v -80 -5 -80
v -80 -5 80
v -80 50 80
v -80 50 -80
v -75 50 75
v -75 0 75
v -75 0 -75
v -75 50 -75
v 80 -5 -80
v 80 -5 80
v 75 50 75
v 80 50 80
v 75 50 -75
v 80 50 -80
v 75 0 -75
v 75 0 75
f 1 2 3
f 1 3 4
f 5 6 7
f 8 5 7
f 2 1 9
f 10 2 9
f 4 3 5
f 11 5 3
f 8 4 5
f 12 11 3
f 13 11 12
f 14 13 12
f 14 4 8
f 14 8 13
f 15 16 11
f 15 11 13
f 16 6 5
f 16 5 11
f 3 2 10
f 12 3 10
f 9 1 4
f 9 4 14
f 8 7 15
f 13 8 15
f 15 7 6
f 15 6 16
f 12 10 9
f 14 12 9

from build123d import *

# Parameters (mm, degrees)
ESQUISSE1_W        = 150
ESQUISSE1_H        = 150
BOSS_EXTRU_1_DEPTH = 50
COQUE2_T           = 5


with BuildPart() as part:
    # Esquisse1 → Boss.-Extru.1 (new body)
    with BuildSketch(Plane(origin=(0, 0, 0), x_dir=(1, 0, 0), z_dir=(0, 1, 0))):
        Rectangle(ESQUISSE1_W, ESQUISSE1_H)
    extrude(amount=BOSS_EXTRU_1_DEPTH)

    # Coque2
    coque2_openings = [part.faces().sort_by_distance(p)[0] for p in [
        (0, 50, 0),
    ]]
    offset(amount=COQUE2_T, openings=coque2_openings, kind=Kind.INTERSECTION)


solid = part.part
